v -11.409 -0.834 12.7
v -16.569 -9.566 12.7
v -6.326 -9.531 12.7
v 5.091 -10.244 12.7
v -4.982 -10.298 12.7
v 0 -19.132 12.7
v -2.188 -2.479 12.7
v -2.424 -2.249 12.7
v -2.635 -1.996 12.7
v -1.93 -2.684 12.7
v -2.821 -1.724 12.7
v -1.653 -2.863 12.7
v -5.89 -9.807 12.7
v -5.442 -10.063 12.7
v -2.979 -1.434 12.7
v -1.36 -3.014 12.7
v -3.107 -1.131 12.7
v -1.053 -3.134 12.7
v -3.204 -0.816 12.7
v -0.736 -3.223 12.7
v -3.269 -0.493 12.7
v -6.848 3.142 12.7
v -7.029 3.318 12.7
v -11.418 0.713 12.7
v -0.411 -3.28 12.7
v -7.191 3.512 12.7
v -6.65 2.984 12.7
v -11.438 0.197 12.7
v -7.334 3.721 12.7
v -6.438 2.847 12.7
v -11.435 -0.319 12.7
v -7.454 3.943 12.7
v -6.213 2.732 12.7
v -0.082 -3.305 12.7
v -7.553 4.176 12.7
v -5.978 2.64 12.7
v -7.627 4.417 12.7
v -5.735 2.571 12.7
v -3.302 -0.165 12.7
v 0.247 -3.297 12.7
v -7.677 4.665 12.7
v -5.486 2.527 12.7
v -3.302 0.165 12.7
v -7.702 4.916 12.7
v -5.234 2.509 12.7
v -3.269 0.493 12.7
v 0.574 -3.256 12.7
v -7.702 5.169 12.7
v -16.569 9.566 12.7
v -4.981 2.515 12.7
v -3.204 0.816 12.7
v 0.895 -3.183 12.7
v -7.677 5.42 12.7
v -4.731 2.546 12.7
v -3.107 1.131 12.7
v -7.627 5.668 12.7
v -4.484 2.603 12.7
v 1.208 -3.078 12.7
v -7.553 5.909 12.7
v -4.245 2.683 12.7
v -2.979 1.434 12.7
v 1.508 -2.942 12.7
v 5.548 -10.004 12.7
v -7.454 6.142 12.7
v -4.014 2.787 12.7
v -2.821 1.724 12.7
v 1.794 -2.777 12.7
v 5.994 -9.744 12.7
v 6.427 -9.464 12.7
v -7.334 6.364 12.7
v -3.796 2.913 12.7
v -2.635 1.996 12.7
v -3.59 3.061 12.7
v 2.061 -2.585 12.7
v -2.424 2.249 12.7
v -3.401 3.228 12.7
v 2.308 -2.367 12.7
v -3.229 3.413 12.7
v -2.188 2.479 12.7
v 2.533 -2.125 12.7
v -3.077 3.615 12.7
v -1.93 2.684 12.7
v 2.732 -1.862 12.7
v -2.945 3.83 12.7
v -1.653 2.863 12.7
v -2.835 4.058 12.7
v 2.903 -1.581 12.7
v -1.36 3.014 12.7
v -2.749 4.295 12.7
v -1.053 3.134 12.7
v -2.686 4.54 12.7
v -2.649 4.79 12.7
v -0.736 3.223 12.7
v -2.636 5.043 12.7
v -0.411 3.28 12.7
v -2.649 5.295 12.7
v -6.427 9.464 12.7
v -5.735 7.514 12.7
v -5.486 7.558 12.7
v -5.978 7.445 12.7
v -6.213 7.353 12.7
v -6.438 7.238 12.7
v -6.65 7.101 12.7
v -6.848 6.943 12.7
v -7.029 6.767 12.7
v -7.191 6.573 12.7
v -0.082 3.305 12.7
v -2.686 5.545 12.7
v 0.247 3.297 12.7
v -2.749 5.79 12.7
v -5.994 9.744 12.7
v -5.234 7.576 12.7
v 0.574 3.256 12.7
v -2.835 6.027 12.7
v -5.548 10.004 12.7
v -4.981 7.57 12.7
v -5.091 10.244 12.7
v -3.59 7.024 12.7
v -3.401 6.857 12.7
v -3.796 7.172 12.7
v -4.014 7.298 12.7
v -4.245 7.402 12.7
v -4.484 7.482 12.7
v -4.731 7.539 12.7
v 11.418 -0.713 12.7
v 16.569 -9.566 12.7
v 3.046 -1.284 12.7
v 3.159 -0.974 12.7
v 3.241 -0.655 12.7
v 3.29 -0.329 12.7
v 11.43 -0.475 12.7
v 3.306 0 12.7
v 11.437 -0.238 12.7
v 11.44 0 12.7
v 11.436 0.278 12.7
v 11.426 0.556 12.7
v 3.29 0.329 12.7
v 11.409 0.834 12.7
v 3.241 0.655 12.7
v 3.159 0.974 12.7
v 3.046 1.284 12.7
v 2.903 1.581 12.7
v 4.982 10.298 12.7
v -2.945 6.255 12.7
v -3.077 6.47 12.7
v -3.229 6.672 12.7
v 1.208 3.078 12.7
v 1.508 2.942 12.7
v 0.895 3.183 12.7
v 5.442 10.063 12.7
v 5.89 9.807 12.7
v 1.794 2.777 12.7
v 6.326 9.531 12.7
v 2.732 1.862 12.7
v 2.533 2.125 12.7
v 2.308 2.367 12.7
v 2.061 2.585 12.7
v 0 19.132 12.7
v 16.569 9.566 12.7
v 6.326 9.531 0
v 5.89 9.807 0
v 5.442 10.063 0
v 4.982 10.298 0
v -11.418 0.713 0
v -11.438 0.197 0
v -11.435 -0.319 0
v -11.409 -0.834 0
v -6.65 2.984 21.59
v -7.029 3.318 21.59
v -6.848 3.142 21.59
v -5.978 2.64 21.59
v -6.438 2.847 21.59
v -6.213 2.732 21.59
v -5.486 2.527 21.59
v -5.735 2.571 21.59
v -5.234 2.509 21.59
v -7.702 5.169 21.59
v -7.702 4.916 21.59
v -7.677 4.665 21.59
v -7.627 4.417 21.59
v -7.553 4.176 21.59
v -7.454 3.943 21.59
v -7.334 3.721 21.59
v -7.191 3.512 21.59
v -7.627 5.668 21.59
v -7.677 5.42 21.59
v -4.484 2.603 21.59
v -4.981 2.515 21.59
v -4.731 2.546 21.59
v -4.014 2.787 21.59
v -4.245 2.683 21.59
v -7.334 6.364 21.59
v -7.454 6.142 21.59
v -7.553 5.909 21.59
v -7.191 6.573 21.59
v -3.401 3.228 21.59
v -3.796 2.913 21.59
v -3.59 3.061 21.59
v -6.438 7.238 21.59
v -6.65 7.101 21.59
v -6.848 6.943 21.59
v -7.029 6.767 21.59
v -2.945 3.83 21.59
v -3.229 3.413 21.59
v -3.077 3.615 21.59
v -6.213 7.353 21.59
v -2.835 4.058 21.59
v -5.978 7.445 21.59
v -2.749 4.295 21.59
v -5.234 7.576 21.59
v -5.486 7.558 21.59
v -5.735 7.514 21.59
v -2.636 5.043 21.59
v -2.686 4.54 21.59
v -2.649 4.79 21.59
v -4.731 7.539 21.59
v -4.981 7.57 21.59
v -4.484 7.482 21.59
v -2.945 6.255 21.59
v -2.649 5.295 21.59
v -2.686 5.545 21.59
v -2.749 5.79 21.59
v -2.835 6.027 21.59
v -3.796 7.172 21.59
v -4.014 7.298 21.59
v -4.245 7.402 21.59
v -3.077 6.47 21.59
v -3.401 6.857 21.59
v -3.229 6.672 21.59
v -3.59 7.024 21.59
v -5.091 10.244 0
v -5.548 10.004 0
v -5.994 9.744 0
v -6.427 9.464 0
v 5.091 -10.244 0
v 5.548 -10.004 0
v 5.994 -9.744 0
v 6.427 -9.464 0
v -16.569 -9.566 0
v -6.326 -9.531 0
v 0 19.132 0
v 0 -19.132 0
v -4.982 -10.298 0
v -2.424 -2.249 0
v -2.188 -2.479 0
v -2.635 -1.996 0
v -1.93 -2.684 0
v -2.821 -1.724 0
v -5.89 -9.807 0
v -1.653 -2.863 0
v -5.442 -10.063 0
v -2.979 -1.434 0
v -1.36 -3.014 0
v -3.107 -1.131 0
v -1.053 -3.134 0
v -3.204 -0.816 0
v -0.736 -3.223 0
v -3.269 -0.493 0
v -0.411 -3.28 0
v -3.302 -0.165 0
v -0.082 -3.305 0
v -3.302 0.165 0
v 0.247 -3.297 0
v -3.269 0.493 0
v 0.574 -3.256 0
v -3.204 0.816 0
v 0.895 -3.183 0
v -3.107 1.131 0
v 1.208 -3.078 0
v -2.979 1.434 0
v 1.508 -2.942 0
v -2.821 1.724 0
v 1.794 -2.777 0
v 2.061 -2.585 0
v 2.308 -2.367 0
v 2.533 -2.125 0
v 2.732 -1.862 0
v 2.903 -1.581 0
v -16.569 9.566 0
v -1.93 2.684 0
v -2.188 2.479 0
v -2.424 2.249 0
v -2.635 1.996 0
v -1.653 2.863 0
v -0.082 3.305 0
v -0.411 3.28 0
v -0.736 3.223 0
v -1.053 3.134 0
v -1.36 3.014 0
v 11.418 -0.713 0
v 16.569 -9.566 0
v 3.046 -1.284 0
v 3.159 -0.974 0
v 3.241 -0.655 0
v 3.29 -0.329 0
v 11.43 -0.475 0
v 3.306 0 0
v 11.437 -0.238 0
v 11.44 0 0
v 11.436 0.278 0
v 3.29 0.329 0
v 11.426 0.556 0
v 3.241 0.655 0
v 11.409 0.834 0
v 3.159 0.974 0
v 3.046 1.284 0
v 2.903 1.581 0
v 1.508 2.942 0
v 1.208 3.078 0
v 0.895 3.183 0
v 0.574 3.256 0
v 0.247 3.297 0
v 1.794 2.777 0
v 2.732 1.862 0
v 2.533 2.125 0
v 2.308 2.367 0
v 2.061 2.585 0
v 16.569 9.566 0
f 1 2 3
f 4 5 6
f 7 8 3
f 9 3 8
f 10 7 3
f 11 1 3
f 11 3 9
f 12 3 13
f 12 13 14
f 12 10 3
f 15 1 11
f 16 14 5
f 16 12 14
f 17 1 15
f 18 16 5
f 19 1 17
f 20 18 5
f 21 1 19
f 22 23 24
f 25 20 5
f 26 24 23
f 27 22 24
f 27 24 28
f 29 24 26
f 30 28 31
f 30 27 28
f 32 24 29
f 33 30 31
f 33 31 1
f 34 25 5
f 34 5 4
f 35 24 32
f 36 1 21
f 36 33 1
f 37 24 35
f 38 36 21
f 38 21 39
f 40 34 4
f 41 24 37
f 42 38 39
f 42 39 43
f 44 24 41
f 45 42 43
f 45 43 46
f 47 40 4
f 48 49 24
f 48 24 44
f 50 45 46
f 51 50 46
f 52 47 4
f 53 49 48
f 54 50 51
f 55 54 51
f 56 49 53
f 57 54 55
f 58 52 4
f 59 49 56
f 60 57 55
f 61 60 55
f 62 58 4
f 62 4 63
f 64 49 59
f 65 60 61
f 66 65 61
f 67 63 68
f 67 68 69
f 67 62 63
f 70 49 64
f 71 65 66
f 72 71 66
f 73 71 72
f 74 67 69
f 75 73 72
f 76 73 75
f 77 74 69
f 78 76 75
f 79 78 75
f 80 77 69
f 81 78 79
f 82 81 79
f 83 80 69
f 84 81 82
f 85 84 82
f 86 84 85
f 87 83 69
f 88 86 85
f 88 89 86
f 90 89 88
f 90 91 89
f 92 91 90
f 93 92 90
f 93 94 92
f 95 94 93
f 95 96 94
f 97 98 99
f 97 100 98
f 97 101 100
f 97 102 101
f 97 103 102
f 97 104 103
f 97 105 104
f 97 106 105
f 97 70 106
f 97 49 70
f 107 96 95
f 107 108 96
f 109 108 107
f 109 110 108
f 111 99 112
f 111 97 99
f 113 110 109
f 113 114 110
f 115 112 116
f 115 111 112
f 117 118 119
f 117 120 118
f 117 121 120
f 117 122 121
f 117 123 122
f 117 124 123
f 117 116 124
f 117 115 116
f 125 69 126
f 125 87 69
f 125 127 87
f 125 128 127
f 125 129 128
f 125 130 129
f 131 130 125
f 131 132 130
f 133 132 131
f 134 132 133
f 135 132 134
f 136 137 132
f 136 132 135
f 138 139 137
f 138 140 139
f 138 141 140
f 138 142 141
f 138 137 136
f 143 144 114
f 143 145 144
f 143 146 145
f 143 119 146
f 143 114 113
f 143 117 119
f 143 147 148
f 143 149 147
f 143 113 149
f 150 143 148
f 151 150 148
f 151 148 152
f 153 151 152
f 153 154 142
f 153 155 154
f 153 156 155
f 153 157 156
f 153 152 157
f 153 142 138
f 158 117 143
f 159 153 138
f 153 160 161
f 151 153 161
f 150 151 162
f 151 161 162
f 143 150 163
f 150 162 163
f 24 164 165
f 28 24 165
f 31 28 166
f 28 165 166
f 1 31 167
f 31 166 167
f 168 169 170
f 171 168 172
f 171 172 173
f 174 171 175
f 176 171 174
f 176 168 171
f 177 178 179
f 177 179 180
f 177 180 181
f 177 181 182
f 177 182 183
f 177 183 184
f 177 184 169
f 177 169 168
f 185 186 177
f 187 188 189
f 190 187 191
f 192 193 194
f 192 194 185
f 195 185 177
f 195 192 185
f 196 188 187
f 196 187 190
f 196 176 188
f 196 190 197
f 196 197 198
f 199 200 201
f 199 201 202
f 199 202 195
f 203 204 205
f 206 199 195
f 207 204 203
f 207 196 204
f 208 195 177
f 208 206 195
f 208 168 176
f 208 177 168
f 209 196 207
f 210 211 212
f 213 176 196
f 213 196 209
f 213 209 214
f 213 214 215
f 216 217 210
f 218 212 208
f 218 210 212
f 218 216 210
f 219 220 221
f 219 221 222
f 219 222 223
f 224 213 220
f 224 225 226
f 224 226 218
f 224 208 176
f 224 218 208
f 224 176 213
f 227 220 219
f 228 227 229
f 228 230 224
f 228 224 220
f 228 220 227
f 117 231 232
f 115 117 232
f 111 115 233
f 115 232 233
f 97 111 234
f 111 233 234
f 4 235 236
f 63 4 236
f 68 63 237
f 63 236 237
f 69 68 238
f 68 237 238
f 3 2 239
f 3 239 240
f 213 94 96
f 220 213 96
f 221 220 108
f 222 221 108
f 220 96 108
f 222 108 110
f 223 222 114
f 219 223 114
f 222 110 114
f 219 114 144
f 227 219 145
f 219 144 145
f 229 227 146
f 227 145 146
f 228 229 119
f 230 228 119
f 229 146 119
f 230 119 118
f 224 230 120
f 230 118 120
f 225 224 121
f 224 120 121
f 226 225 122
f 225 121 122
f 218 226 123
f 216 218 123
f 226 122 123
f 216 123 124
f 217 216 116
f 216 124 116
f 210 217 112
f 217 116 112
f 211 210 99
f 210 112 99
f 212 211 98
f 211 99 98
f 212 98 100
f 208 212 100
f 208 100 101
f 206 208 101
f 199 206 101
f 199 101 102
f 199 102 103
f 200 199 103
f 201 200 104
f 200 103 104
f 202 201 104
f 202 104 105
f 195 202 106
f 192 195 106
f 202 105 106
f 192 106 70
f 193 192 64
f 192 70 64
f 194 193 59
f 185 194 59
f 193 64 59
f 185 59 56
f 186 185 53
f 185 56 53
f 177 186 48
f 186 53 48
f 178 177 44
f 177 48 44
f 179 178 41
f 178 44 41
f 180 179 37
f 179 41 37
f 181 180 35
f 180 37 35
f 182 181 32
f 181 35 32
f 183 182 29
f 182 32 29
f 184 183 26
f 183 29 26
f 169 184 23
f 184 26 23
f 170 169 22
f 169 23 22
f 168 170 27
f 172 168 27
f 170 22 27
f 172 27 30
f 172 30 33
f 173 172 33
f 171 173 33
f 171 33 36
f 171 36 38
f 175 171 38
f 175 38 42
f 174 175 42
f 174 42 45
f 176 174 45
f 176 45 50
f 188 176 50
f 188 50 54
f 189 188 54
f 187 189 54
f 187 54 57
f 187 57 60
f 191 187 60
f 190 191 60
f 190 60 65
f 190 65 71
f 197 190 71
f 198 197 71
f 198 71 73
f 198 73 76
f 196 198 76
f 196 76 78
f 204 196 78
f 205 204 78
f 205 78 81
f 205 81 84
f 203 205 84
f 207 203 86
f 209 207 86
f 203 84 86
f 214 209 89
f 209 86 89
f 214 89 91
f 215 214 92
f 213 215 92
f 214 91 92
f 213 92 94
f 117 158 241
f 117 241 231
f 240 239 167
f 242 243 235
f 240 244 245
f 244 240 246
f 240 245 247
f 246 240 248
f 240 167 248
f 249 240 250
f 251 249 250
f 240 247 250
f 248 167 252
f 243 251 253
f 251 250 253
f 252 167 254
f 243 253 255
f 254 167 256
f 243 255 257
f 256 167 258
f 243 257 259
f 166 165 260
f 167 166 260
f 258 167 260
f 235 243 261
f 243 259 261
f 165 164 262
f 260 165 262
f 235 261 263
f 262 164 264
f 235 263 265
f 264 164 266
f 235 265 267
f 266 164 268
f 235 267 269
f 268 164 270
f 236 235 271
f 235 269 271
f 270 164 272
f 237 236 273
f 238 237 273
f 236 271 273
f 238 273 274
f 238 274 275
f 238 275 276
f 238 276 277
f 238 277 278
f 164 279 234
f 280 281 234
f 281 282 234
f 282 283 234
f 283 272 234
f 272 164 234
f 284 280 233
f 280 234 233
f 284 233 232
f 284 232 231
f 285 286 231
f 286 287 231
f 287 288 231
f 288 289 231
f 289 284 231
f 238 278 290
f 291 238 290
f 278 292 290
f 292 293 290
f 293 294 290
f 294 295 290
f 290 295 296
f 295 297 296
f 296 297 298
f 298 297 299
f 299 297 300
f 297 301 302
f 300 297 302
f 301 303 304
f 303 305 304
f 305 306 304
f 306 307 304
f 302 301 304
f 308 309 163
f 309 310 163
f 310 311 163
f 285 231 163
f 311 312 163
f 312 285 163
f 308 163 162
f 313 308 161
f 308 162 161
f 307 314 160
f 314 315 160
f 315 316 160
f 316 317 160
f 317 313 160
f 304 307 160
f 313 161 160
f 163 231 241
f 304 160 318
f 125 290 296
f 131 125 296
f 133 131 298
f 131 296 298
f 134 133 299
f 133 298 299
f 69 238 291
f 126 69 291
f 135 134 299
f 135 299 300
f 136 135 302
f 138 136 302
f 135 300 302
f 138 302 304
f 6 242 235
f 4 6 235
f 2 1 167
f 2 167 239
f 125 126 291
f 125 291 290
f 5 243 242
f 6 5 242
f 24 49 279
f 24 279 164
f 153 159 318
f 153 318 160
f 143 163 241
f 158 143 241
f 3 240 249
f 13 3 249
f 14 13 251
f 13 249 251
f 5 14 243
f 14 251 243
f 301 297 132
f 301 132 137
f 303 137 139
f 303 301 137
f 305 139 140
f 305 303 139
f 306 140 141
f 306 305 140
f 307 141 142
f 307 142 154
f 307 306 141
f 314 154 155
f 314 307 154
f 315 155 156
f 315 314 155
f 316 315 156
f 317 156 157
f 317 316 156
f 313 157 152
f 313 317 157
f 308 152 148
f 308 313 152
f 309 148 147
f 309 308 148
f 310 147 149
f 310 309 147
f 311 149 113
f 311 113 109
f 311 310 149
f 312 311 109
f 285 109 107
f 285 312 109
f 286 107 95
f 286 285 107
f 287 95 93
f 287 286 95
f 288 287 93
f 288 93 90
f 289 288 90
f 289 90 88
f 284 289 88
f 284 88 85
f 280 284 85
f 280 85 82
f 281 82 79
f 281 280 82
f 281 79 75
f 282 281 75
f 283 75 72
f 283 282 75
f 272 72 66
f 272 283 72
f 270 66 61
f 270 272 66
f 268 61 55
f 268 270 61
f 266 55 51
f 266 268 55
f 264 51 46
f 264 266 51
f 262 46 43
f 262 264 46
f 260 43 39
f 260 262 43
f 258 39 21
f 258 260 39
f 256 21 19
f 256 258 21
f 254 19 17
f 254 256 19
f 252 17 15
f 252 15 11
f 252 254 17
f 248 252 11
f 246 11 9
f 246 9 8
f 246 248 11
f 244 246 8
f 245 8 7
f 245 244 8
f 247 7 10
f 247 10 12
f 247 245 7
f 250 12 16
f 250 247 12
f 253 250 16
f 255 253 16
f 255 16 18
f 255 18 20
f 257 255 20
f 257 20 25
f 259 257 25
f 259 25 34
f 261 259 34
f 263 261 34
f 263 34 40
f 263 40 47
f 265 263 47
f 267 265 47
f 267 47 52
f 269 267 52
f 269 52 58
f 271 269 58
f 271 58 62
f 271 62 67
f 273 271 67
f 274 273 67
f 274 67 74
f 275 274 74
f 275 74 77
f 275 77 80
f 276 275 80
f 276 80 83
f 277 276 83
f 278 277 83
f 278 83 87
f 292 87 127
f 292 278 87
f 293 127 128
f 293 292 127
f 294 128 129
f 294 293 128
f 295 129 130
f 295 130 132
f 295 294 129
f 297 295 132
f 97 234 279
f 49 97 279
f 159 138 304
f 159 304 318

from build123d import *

# Parameters (mm, degrees)
F0_R     = 3.306105
F1_DEPTH = 12.7
F2_R     = 2.534693
F3_DEPTH = 8.89


with BuildPart() as f1:
    # F0 (on Top) → F1 (new body)
    with BuildSketch(Plane.XY):
        with BuildLine():
            ThreePointArc((11.417595, -0.712938), (11.434271, -0.356642), (11.439832, 0))
            ThreePointArc((11.439832, 0), (11.432214, 0.417404), (11.409372, 0.834252))
            ThreePointArc((11.409372, 0.834252), (9.876647, 5.772486), (6.32622, 9.531458))
            ThreePointArc((6.32622, 9.531458), (5.667184, 9.937443), (4.982202, 10.297932))
            ThreePointArc((4.982202, 10.297932), (2.555693, 11.150703), (0, 11.439832))
            ThreePointArc((0, 11.439832), (-2.614917, 11.136963), (-5.091375, 10.244396))
            ThreePointArc((-5.091375, 10.244396), (-5.772486, 9.876647), (-6.42717, 9.46368))
            ThreePointArc((-6.42717, 9.46368), (-9.937443, 5.667184), (-11.417595, 0.712938))
            ThreePointArc((-11.417595, 0.712938), (-11.43967, -0.060796), (-11.409372, -0.834252))
            ThreePointArc((-11.409372, -0.834252), (-9.876647, -5.772486), (-6.32622, -9.531458))
            ThreePointArc((-6.32622, -9.531458), (-5.667184, -9.937443), (-4.982202, -10.297932))
            ThreePointArc((-4.982202, -10.297932), (0.060796, -11.43967), (5.091375, -10.244396))
            ThreePointArc((5.091375, -10.244396), (5.772486, -9.876647), (6.42717, -9.46368))
            ThreePointArc((6.42717, -9.46368), (9.937443, -5.667184), (11.417595, -0.712938))
        make_face()
        Circle(F0_R, mode=Mode.SUBTRACT)
        with BuildLine():
            ThreePointArc((6.32622, 9.531458), (9.876647, 5.772486), (11.409372, 0.834252))
            Line((11.409372, 0.834252), (16.56909, 9.566168))
            Line((16.56909, 9.566168), (6.32622, 9.531458))
        make_face()
        with BuildLine():
            Line((16.56909, -9.566168), (11.417595, -0.712938))
            ThreePointArc((11.417595, -0.712938), (9.937443, -5.667184), (6.42717, -9.46368))
            Line((6.42717, -9.46368), (16.56909, -9.566168))
        make_face()
        with BuildLine():
            ThreePointArc((0, 11.439832), (2.555693, 11.150703), (4.982202, 10.297932))
            Line((4.982202, 10.297932), (0, 19.132337))
            Line((0, 19.132337), (0, 11.439832))
        make_face()
        with BuildLine():
            Line((0, -19.132337), (5.091375, -10.244396))
            ThreePointArc((5.091375, -10.244396), (0.060796, -11.43967), (-4.982202, -10.297932))
            Line((-4.982202, -10.297932), (0, -19.132337))
        make_face()
        with BuildLine():
            ThreePointArc((-5.091375, 10.244396), (-2.614917, 11.136963), (0, 11.439832))
            Line((0, 11.439832), (0, 19.132337))
            Line((0, 19.132337), (-5.091375, 10.244396))
        make_face()
        with BuildLine():
            Line((-16.56909, -9.566168), (-6.32622, -9.531458))
            ThreePointArc((-6.32622, -9.531458), (-9.876647, -5.772486), (-11.409372, -0.834252))
            Line((-11.409372, -0.834252), (-16.56909, -9.566168))
        make_face()
        with BuildLine():
            ThreePointArc((-11.417595, 0.712938), (-9.937443, 5.667184), (-6.42717, 9.46368))
            Line((-6.42717, 9.46368), (-16.56909, 9.566168))
            Line((-16.56909, 9.566168), (-11.417595, 0.712938))
        make_face()
    extrude(amount=F1_DEPTH)

    # F2 (on face) → F3 (join)
    with BuildSketch(Plane.XY.offset(12.7)):
        with Locations((-5.170809, 5.042512)):
            Circle(F2_R)
    extrude(amount=F3_DEPTH)


solid = f1.part
